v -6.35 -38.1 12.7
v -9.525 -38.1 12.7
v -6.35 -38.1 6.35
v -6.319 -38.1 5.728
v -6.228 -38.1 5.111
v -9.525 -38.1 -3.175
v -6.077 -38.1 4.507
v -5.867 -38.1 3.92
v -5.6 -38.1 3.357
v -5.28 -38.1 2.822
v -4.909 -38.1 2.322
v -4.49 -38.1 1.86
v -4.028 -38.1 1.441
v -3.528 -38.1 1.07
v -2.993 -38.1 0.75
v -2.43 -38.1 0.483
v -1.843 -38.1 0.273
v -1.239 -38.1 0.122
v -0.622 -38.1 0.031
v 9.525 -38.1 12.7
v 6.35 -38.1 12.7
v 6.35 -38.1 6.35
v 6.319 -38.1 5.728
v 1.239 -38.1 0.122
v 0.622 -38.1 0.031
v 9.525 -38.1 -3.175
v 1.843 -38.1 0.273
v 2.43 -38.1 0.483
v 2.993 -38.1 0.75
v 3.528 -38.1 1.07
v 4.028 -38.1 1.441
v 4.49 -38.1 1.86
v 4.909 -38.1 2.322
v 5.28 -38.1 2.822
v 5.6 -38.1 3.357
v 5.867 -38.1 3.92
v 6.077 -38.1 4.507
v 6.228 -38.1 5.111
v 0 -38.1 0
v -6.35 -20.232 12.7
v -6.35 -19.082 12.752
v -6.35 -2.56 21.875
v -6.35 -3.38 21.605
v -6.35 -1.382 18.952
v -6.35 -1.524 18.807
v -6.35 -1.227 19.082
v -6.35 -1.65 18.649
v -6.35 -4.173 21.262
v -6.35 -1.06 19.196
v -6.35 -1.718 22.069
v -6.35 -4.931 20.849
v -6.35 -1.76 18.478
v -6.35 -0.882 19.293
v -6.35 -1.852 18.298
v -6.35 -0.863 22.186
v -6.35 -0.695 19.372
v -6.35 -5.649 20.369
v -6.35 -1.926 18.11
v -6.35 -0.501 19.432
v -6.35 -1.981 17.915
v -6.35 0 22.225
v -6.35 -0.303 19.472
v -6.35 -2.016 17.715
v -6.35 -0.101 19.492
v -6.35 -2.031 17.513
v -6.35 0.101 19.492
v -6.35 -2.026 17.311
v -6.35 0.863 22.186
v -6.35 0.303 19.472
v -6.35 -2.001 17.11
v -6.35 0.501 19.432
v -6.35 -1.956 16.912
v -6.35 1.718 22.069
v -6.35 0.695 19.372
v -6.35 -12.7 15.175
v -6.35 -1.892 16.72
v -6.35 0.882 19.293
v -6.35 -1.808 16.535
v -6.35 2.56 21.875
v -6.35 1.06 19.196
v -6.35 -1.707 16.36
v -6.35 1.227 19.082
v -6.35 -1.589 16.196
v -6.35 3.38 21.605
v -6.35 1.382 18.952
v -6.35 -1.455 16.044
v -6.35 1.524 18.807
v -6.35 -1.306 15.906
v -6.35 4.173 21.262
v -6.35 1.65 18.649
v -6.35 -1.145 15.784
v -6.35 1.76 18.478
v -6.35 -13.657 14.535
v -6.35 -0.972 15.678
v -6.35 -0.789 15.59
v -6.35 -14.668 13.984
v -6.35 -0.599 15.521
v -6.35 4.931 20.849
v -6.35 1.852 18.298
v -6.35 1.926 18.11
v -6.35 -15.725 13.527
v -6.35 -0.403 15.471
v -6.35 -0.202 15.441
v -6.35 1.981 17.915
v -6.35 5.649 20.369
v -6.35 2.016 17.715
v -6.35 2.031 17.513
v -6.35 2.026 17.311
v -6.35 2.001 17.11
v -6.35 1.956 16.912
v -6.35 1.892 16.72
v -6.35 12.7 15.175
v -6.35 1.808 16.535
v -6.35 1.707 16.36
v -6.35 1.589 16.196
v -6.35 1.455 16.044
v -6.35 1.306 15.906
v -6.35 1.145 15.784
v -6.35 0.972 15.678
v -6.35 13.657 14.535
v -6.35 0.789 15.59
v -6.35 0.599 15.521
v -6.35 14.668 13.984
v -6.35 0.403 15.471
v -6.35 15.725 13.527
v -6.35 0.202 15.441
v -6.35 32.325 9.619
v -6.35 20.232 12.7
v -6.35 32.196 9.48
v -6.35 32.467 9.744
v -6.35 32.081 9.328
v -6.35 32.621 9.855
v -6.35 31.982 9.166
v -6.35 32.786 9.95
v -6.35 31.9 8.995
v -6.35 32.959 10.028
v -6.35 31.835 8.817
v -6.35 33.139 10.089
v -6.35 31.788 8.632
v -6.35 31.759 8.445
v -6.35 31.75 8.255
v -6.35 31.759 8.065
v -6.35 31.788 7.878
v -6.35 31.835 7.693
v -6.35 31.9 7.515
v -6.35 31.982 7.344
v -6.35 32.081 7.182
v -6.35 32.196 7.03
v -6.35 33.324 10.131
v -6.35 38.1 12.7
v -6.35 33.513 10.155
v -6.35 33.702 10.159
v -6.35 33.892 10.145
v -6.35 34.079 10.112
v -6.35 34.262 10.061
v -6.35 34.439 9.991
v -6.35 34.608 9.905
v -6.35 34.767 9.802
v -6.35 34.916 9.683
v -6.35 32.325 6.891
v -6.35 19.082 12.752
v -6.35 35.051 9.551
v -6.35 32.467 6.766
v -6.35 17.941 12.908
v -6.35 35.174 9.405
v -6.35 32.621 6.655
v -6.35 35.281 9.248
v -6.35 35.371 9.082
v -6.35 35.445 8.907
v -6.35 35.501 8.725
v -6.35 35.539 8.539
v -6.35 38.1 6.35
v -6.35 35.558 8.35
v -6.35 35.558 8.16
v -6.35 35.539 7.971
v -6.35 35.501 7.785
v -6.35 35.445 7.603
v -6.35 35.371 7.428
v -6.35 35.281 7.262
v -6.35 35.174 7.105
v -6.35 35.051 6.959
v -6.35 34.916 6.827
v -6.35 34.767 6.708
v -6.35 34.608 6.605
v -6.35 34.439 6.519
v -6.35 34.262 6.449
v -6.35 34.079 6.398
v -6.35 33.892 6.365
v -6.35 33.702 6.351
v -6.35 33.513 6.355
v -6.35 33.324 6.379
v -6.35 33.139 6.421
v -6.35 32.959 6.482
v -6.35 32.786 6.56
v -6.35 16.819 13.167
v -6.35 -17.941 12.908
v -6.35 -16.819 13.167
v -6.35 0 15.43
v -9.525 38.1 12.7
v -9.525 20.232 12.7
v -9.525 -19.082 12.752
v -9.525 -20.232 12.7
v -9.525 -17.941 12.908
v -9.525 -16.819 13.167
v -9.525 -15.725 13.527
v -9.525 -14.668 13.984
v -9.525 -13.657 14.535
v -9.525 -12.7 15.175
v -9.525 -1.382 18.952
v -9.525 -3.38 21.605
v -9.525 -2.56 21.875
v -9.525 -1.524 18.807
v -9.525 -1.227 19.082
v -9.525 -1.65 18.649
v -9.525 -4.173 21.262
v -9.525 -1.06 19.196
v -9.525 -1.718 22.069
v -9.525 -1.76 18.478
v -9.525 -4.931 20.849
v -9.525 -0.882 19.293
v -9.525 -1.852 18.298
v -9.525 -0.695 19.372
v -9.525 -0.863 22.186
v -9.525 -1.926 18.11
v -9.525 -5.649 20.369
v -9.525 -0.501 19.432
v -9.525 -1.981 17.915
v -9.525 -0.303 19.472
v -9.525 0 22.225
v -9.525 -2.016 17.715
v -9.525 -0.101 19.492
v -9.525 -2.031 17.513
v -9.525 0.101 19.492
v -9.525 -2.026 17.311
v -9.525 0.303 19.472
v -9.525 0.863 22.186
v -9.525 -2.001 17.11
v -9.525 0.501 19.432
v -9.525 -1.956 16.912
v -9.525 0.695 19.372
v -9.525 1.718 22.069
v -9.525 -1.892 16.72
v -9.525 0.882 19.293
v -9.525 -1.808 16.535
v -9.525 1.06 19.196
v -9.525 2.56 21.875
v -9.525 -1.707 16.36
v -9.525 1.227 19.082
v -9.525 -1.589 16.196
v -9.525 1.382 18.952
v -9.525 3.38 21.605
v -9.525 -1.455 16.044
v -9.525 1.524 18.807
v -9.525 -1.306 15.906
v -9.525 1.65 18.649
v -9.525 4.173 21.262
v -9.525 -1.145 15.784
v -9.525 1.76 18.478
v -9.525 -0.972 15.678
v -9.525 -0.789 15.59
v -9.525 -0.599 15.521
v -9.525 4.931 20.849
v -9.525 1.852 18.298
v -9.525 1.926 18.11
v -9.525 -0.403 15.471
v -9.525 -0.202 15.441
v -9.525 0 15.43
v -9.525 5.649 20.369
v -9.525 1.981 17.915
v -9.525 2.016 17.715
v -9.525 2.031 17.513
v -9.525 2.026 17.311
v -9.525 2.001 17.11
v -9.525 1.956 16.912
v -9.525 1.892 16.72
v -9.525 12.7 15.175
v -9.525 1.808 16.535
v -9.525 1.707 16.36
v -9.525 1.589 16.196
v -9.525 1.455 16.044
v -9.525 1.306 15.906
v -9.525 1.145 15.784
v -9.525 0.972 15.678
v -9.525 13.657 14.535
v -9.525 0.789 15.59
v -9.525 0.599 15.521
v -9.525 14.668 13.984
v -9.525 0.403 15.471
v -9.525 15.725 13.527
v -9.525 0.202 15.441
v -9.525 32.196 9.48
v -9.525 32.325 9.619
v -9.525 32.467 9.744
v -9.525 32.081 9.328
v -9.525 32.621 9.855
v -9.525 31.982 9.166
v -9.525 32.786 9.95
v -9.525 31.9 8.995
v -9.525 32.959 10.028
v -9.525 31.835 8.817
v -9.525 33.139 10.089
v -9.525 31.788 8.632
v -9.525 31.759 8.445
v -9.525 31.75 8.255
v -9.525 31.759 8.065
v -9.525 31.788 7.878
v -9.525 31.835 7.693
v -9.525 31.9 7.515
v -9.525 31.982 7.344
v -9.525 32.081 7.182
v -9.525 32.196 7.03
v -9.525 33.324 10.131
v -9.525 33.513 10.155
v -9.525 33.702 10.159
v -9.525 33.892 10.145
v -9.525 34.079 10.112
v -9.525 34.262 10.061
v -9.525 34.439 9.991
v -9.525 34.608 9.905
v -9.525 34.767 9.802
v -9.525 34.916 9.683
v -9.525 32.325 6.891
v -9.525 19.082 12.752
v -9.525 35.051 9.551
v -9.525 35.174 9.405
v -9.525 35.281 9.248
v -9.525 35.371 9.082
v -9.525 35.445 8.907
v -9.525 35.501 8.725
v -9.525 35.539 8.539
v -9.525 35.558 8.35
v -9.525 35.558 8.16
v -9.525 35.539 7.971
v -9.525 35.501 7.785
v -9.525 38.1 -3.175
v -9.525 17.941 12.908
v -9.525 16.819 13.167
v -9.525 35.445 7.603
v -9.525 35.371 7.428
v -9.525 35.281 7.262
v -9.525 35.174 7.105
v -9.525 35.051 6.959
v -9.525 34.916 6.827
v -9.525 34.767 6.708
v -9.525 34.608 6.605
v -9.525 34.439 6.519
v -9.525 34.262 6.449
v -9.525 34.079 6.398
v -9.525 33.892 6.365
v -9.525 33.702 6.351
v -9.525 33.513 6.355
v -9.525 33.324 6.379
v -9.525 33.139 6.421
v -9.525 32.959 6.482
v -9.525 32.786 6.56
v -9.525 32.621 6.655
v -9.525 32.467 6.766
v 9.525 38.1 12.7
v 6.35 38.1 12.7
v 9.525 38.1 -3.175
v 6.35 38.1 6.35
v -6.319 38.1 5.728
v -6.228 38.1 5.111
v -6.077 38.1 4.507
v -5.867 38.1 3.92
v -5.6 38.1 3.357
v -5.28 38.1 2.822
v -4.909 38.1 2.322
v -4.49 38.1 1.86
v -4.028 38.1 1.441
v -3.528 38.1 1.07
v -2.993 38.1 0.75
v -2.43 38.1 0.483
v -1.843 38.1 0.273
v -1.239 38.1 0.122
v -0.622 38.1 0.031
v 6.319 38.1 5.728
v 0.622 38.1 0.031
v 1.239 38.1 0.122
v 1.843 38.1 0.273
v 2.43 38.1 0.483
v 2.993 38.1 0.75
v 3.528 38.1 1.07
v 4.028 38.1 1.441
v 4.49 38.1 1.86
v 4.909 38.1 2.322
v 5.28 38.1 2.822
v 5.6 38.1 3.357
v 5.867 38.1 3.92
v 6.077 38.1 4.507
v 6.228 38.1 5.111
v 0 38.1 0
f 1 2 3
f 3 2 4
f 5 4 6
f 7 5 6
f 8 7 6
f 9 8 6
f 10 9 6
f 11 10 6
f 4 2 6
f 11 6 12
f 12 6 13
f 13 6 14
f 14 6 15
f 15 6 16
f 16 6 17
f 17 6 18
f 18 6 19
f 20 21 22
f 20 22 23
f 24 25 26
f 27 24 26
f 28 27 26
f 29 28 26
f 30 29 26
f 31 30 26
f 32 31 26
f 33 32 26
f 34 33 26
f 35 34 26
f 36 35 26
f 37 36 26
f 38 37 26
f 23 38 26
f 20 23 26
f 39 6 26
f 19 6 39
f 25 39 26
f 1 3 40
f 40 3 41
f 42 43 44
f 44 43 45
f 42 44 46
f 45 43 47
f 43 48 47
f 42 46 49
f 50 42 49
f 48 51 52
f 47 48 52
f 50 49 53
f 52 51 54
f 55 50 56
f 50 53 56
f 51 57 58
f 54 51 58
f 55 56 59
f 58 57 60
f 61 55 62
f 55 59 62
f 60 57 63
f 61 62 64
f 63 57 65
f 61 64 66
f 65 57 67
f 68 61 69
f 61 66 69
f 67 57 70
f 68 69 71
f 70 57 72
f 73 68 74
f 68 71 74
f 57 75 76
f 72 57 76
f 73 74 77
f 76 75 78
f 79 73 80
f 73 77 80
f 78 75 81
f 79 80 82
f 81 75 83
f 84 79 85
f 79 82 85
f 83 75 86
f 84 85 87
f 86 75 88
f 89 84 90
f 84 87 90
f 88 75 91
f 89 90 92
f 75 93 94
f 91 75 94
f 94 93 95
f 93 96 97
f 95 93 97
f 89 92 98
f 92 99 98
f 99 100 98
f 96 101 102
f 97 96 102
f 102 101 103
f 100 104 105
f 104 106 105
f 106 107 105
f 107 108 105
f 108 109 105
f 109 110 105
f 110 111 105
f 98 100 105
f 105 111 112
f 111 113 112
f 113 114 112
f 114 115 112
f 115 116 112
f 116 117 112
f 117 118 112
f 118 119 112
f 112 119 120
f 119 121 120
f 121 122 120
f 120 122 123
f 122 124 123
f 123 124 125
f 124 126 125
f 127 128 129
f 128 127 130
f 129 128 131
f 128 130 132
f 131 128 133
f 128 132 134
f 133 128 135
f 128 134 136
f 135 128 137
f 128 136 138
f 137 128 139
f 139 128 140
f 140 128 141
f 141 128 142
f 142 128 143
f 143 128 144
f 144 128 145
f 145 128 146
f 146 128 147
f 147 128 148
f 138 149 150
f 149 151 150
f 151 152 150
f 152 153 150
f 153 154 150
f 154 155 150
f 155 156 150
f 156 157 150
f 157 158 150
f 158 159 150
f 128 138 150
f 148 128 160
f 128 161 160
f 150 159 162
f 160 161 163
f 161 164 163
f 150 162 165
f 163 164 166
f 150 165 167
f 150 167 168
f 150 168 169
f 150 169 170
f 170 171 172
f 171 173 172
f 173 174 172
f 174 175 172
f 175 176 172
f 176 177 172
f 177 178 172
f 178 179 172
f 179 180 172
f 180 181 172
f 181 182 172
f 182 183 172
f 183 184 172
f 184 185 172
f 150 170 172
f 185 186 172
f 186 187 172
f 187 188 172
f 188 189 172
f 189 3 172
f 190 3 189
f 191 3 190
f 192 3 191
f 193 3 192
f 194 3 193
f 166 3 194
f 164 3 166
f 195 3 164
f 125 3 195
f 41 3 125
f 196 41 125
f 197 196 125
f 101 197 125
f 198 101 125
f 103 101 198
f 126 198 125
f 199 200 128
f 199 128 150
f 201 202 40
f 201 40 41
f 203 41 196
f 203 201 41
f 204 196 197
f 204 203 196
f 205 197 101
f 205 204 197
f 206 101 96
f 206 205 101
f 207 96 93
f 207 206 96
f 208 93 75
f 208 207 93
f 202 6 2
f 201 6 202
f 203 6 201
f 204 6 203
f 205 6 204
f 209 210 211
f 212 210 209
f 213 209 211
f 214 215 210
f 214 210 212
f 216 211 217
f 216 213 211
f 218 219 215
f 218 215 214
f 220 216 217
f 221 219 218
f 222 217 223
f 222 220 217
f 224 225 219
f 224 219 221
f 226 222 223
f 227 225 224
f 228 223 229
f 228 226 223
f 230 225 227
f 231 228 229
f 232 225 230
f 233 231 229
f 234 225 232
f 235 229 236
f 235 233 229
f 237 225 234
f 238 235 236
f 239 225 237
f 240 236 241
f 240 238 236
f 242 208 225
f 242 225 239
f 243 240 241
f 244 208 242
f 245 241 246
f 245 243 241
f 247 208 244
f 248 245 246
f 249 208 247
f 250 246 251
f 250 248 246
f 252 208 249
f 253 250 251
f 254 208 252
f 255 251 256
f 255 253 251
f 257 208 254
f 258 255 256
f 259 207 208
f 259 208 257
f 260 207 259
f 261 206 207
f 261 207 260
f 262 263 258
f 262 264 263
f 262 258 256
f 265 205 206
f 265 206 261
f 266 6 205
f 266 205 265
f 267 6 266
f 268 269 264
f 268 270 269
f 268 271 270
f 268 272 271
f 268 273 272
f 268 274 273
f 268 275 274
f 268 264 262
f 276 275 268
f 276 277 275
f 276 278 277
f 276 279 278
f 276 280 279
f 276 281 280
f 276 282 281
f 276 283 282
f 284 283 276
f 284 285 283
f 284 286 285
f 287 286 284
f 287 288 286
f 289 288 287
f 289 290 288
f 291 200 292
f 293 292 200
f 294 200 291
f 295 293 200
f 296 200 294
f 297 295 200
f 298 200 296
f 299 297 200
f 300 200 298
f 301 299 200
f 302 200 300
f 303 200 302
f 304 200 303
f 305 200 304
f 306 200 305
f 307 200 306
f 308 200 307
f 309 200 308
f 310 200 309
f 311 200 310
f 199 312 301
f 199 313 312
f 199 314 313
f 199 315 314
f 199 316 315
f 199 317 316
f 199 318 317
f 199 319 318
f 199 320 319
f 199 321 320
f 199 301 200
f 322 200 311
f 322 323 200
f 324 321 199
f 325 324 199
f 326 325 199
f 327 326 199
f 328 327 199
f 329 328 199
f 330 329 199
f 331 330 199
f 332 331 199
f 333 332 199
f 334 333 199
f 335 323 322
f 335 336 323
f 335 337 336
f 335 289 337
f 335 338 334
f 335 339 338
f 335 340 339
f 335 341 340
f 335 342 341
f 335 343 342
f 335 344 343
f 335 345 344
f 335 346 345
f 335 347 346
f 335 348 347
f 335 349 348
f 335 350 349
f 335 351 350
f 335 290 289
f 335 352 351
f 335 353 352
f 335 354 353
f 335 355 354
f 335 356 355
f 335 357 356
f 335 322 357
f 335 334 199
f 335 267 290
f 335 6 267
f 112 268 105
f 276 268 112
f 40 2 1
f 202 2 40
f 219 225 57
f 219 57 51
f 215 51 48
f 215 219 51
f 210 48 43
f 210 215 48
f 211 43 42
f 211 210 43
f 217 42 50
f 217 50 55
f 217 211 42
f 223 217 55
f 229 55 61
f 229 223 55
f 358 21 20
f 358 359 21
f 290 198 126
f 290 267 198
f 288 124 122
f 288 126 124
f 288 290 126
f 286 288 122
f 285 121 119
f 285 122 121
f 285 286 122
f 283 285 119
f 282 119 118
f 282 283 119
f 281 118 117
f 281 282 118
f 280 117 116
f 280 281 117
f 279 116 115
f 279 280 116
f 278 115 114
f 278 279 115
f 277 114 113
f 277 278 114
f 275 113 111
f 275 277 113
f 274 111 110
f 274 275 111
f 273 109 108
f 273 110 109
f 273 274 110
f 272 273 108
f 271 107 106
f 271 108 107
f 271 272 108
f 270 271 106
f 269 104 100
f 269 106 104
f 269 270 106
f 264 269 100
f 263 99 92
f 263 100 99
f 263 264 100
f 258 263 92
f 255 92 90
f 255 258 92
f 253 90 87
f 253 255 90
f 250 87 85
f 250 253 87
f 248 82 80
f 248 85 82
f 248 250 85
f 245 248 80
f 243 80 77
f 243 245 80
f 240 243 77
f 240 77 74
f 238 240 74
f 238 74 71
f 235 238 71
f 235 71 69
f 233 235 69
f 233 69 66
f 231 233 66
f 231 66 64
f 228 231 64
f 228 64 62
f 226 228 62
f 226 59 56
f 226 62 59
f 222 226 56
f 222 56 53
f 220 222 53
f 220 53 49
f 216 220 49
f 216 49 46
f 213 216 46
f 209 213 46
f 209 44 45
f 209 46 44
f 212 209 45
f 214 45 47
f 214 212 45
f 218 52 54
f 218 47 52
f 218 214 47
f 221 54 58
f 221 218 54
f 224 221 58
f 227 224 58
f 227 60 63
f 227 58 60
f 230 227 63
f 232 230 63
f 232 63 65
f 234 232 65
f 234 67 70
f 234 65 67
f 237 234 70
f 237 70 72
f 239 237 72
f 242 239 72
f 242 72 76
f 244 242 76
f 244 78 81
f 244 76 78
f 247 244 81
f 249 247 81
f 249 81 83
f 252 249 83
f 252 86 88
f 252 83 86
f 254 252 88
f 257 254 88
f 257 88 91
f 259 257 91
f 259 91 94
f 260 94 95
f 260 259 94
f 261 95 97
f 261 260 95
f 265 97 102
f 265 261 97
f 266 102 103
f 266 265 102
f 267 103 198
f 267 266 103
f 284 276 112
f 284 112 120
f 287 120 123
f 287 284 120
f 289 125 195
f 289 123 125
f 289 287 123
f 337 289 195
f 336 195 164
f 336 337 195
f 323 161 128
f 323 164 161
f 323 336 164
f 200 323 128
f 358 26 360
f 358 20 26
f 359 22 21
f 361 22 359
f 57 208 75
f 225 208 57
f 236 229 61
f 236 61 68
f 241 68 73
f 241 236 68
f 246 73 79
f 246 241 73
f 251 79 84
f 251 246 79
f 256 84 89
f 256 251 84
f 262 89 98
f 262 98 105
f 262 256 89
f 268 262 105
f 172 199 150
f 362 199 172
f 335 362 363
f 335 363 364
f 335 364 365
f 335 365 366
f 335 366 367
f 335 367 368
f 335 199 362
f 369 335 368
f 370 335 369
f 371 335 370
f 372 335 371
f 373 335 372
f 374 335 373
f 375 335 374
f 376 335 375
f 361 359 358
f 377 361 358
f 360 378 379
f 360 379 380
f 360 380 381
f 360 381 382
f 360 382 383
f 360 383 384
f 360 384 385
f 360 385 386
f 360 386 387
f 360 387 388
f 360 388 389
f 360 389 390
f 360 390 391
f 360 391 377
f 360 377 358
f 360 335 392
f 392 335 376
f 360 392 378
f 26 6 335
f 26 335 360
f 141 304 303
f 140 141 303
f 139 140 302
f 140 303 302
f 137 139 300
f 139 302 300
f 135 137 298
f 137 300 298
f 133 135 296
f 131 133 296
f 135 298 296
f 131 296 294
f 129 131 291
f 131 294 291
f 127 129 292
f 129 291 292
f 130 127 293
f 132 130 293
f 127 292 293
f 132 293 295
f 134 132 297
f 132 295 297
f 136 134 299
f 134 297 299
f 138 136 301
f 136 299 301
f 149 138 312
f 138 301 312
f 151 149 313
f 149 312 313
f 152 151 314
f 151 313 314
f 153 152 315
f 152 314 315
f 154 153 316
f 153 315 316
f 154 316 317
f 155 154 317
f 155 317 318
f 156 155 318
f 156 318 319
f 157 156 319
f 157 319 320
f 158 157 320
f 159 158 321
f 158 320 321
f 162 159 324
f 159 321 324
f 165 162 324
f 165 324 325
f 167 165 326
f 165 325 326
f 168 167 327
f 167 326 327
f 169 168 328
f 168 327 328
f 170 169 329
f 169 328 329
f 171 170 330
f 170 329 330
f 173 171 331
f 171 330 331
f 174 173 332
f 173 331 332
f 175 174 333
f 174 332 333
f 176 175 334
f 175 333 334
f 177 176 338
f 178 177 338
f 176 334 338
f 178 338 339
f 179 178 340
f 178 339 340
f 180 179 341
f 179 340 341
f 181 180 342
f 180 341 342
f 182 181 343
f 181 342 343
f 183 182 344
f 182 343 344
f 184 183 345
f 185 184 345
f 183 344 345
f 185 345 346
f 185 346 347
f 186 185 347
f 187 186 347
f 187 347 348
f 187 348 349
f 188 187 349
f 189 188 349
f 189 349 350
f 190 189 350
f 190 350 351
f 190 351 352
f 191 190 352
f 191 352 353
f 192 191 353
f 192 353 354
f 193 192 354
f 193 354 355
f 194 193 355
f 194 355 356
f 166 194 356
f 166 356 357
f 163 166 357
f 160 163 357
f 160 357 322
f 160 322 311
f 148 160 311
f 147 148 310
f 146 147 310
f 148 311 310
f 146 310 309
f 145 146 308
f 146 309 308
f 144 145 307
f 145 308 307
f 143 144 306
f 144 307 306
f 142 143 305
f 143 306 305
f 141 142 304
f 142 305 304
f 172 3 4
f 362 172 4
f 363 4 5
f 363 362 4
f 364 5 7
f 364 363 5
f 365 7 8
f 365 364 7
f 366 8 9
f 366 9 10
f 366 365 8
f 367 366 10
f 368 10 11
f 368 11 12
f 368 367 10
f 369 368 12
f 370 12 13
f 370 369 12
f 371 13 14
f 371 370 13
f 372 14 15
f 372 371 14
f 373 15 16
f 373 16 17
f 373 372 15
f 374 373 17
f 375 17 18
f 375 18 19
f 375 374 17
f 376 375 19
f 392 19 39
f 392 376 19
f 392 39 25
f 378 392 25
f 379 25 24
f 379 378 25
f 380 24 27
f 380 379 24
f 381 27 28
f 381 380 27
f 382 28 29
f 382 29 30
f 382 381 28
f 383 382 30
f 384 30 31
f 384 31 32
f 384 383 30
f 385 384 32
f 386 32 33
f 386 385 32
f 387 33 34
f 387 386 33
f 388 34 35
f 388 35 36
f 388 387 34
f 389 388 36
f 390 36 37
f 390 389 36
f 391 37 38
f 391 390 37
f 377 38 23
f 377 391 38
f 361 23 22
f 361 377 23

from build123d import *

# Parameters (mm, degrees)
SKETCH1_W               = 3.175
SKETCH1_H               = 76.2
BOSS_EXTRUDE1_DEPTH     = 12.7
BOSS_EXTRUDE1_2_DEPTH   = 12.7
SKETCH1_3_W             = 12.7
SKETCH1_3_H             = 76.2
SKETCH1_3_W_2           = 3.175
BOSS_EXTRUDE2_DEPTH     = 3.175
FILLET1_R               = 6.35
SKETCH2_W               = 3.175
SKETCH2_H               = 76.2
BOSS_EXTRUDE3_DEPTH     = 9.525
CUT_EXTRUDE1_DEPTH      = 47.878313216
CUT_EXTRUDE1_DEPTH_BACK = 47.878313216
SKETCH3_R               = 2.032
SKETCH4_R               = 1.905
CUT_EXTRUDE2_DEPTH      = 3.175


with BuildPart() as part:
    # Sketch1 → Boss-Extrude1 (new body)
    with BuildSketch(Plane.XY):
        with Locations((-7.9375, 0)):
            Rectangle(SKETCH1_W, SKETCH1_H)
    extrude(amount=BOSS_EXTRUDE1_DEPTH)



with BuildPart() as body_2:
    # Sketch1 → Boss-Extrude1 2 (new body)
    with BuildSketch(Plane.XY):
        with Locations((7.9375, 0)):
            Rectangle(SKETCH1_W, SKETCH1_H)
    extrude(amount=BOSS_EXTRUDE1_2_DEPTH)


with BuildPart() as part_1:
    add(part.part)

    add(body_2.part)  # Boss-Extrude2 merges body 2
    # Sketch1<3> → Boss-Extrude2 (add)
    with BuildSketch(Plane.XY):
        Rectangle(SKETCH1_3_W, SKETCH1_3_H)
        with Locations((7.9375, 0)):
            Rectangle(SKETCH1_3_W_2, SKETCH1_3_H)
        with Locations((-7.9375, 0)):
            Rectangle(SKETCH1_3_W_2, SKETCH1_3_H)
    extrude(amount=-BOSS_EXTRUDE2_DEPTH)

    # Fillet1
    fillet1_edges = [part_1.edges().sort_by_distance(p)[0] for p in [
        (6.35, 0, 0),
        (-6.35, 0, 0),
    ]]
    fillet(fillet1_edges, radius=FILLET1_R - 0.0001)  # a hair under: the kernel refuses the full size

    # Sketch2 → Boss-Extrude3 (add)
    with BuildSketch(Plane.XY.offset(12.7)):
        with Locations((-7.9375, 0)):
            Rectangle(SKETCH2_W, SKETCH2_H)
    extrude(amount=BOSS_EXTRUDE3_DEPTH)

    # Sketch3 → Cut-Extrude1 (cut, two sides: drawn at the far end of the back side and taken through both)
    with BuildSketch(Plane(origin=(-6.35, 0, 0), x_dir=(0, 0, -1), z_dir=(1, 0, 0)).offset(-CUT_EXTRUDE1_DEPTH_BACK)):
        with BuildLine():
            Line((-12.7, 38.1), (-22.225, 38.1))
            Line((-22.225, 38.1), (-22.225, -6.1e-08))
            ThreePointArc((-22.225, -6.1e-08), (-21.749068291, 2.973211742), (-20.368834491, 5.649301068))
            Line((-20.368834491, 5.649301068), (-15.174887346, 12.7))
            ThreePointArc((-15.174887346, 12.7), (-13.334575625, 16.268119062), (-12.7, 20.232401424))
            Line((-12.7, 20.232401424), (-12.7, 38.1))
        make_face()
        with BuildLine():
            ThreePointArc((-20.368834491, -5.649301068), (-21.749068272, -2.973211801), (-22.225, -6.1e-08))
            Line((-22.225, -6.1e-08), (-22.225, -38.1))
            Line((-22.225, -38.1), (-12.7, -38.1))
            Line((-12.7, -38.1), (-12.7, -20.232401424))
            ThreePointArc((-12.7, -20.232401424), (-13.334575625, -16.268119062), (-15.174887346, -12.7))
            Line((-15.174887346, -12.7), (-20.368834491, -5.649301068))
        make_face()
        with Locations((-17.4625, 0)):
            Circle(SKETCH3_R)
    extrude(amount=CUT_EXTRUDE1_DEPTH + CUT_EXTRUDE1_DEPTH_BACK, mode=Mode.SUBTRACT)

    # Sketch4 → Cut-Extrude2 (cut)
    with BuildSketch(Plane.ZY.offset(9.525)):
        with Locations(Location((8.255, 33.655, 0), (0, 0, 270))):
            Circle(SKETCH4_R)
    extrude(amount=-CUT_EXTRUDE2_DEPTH, mode=Mode.SUBTRACT)


solid = part_1.part
